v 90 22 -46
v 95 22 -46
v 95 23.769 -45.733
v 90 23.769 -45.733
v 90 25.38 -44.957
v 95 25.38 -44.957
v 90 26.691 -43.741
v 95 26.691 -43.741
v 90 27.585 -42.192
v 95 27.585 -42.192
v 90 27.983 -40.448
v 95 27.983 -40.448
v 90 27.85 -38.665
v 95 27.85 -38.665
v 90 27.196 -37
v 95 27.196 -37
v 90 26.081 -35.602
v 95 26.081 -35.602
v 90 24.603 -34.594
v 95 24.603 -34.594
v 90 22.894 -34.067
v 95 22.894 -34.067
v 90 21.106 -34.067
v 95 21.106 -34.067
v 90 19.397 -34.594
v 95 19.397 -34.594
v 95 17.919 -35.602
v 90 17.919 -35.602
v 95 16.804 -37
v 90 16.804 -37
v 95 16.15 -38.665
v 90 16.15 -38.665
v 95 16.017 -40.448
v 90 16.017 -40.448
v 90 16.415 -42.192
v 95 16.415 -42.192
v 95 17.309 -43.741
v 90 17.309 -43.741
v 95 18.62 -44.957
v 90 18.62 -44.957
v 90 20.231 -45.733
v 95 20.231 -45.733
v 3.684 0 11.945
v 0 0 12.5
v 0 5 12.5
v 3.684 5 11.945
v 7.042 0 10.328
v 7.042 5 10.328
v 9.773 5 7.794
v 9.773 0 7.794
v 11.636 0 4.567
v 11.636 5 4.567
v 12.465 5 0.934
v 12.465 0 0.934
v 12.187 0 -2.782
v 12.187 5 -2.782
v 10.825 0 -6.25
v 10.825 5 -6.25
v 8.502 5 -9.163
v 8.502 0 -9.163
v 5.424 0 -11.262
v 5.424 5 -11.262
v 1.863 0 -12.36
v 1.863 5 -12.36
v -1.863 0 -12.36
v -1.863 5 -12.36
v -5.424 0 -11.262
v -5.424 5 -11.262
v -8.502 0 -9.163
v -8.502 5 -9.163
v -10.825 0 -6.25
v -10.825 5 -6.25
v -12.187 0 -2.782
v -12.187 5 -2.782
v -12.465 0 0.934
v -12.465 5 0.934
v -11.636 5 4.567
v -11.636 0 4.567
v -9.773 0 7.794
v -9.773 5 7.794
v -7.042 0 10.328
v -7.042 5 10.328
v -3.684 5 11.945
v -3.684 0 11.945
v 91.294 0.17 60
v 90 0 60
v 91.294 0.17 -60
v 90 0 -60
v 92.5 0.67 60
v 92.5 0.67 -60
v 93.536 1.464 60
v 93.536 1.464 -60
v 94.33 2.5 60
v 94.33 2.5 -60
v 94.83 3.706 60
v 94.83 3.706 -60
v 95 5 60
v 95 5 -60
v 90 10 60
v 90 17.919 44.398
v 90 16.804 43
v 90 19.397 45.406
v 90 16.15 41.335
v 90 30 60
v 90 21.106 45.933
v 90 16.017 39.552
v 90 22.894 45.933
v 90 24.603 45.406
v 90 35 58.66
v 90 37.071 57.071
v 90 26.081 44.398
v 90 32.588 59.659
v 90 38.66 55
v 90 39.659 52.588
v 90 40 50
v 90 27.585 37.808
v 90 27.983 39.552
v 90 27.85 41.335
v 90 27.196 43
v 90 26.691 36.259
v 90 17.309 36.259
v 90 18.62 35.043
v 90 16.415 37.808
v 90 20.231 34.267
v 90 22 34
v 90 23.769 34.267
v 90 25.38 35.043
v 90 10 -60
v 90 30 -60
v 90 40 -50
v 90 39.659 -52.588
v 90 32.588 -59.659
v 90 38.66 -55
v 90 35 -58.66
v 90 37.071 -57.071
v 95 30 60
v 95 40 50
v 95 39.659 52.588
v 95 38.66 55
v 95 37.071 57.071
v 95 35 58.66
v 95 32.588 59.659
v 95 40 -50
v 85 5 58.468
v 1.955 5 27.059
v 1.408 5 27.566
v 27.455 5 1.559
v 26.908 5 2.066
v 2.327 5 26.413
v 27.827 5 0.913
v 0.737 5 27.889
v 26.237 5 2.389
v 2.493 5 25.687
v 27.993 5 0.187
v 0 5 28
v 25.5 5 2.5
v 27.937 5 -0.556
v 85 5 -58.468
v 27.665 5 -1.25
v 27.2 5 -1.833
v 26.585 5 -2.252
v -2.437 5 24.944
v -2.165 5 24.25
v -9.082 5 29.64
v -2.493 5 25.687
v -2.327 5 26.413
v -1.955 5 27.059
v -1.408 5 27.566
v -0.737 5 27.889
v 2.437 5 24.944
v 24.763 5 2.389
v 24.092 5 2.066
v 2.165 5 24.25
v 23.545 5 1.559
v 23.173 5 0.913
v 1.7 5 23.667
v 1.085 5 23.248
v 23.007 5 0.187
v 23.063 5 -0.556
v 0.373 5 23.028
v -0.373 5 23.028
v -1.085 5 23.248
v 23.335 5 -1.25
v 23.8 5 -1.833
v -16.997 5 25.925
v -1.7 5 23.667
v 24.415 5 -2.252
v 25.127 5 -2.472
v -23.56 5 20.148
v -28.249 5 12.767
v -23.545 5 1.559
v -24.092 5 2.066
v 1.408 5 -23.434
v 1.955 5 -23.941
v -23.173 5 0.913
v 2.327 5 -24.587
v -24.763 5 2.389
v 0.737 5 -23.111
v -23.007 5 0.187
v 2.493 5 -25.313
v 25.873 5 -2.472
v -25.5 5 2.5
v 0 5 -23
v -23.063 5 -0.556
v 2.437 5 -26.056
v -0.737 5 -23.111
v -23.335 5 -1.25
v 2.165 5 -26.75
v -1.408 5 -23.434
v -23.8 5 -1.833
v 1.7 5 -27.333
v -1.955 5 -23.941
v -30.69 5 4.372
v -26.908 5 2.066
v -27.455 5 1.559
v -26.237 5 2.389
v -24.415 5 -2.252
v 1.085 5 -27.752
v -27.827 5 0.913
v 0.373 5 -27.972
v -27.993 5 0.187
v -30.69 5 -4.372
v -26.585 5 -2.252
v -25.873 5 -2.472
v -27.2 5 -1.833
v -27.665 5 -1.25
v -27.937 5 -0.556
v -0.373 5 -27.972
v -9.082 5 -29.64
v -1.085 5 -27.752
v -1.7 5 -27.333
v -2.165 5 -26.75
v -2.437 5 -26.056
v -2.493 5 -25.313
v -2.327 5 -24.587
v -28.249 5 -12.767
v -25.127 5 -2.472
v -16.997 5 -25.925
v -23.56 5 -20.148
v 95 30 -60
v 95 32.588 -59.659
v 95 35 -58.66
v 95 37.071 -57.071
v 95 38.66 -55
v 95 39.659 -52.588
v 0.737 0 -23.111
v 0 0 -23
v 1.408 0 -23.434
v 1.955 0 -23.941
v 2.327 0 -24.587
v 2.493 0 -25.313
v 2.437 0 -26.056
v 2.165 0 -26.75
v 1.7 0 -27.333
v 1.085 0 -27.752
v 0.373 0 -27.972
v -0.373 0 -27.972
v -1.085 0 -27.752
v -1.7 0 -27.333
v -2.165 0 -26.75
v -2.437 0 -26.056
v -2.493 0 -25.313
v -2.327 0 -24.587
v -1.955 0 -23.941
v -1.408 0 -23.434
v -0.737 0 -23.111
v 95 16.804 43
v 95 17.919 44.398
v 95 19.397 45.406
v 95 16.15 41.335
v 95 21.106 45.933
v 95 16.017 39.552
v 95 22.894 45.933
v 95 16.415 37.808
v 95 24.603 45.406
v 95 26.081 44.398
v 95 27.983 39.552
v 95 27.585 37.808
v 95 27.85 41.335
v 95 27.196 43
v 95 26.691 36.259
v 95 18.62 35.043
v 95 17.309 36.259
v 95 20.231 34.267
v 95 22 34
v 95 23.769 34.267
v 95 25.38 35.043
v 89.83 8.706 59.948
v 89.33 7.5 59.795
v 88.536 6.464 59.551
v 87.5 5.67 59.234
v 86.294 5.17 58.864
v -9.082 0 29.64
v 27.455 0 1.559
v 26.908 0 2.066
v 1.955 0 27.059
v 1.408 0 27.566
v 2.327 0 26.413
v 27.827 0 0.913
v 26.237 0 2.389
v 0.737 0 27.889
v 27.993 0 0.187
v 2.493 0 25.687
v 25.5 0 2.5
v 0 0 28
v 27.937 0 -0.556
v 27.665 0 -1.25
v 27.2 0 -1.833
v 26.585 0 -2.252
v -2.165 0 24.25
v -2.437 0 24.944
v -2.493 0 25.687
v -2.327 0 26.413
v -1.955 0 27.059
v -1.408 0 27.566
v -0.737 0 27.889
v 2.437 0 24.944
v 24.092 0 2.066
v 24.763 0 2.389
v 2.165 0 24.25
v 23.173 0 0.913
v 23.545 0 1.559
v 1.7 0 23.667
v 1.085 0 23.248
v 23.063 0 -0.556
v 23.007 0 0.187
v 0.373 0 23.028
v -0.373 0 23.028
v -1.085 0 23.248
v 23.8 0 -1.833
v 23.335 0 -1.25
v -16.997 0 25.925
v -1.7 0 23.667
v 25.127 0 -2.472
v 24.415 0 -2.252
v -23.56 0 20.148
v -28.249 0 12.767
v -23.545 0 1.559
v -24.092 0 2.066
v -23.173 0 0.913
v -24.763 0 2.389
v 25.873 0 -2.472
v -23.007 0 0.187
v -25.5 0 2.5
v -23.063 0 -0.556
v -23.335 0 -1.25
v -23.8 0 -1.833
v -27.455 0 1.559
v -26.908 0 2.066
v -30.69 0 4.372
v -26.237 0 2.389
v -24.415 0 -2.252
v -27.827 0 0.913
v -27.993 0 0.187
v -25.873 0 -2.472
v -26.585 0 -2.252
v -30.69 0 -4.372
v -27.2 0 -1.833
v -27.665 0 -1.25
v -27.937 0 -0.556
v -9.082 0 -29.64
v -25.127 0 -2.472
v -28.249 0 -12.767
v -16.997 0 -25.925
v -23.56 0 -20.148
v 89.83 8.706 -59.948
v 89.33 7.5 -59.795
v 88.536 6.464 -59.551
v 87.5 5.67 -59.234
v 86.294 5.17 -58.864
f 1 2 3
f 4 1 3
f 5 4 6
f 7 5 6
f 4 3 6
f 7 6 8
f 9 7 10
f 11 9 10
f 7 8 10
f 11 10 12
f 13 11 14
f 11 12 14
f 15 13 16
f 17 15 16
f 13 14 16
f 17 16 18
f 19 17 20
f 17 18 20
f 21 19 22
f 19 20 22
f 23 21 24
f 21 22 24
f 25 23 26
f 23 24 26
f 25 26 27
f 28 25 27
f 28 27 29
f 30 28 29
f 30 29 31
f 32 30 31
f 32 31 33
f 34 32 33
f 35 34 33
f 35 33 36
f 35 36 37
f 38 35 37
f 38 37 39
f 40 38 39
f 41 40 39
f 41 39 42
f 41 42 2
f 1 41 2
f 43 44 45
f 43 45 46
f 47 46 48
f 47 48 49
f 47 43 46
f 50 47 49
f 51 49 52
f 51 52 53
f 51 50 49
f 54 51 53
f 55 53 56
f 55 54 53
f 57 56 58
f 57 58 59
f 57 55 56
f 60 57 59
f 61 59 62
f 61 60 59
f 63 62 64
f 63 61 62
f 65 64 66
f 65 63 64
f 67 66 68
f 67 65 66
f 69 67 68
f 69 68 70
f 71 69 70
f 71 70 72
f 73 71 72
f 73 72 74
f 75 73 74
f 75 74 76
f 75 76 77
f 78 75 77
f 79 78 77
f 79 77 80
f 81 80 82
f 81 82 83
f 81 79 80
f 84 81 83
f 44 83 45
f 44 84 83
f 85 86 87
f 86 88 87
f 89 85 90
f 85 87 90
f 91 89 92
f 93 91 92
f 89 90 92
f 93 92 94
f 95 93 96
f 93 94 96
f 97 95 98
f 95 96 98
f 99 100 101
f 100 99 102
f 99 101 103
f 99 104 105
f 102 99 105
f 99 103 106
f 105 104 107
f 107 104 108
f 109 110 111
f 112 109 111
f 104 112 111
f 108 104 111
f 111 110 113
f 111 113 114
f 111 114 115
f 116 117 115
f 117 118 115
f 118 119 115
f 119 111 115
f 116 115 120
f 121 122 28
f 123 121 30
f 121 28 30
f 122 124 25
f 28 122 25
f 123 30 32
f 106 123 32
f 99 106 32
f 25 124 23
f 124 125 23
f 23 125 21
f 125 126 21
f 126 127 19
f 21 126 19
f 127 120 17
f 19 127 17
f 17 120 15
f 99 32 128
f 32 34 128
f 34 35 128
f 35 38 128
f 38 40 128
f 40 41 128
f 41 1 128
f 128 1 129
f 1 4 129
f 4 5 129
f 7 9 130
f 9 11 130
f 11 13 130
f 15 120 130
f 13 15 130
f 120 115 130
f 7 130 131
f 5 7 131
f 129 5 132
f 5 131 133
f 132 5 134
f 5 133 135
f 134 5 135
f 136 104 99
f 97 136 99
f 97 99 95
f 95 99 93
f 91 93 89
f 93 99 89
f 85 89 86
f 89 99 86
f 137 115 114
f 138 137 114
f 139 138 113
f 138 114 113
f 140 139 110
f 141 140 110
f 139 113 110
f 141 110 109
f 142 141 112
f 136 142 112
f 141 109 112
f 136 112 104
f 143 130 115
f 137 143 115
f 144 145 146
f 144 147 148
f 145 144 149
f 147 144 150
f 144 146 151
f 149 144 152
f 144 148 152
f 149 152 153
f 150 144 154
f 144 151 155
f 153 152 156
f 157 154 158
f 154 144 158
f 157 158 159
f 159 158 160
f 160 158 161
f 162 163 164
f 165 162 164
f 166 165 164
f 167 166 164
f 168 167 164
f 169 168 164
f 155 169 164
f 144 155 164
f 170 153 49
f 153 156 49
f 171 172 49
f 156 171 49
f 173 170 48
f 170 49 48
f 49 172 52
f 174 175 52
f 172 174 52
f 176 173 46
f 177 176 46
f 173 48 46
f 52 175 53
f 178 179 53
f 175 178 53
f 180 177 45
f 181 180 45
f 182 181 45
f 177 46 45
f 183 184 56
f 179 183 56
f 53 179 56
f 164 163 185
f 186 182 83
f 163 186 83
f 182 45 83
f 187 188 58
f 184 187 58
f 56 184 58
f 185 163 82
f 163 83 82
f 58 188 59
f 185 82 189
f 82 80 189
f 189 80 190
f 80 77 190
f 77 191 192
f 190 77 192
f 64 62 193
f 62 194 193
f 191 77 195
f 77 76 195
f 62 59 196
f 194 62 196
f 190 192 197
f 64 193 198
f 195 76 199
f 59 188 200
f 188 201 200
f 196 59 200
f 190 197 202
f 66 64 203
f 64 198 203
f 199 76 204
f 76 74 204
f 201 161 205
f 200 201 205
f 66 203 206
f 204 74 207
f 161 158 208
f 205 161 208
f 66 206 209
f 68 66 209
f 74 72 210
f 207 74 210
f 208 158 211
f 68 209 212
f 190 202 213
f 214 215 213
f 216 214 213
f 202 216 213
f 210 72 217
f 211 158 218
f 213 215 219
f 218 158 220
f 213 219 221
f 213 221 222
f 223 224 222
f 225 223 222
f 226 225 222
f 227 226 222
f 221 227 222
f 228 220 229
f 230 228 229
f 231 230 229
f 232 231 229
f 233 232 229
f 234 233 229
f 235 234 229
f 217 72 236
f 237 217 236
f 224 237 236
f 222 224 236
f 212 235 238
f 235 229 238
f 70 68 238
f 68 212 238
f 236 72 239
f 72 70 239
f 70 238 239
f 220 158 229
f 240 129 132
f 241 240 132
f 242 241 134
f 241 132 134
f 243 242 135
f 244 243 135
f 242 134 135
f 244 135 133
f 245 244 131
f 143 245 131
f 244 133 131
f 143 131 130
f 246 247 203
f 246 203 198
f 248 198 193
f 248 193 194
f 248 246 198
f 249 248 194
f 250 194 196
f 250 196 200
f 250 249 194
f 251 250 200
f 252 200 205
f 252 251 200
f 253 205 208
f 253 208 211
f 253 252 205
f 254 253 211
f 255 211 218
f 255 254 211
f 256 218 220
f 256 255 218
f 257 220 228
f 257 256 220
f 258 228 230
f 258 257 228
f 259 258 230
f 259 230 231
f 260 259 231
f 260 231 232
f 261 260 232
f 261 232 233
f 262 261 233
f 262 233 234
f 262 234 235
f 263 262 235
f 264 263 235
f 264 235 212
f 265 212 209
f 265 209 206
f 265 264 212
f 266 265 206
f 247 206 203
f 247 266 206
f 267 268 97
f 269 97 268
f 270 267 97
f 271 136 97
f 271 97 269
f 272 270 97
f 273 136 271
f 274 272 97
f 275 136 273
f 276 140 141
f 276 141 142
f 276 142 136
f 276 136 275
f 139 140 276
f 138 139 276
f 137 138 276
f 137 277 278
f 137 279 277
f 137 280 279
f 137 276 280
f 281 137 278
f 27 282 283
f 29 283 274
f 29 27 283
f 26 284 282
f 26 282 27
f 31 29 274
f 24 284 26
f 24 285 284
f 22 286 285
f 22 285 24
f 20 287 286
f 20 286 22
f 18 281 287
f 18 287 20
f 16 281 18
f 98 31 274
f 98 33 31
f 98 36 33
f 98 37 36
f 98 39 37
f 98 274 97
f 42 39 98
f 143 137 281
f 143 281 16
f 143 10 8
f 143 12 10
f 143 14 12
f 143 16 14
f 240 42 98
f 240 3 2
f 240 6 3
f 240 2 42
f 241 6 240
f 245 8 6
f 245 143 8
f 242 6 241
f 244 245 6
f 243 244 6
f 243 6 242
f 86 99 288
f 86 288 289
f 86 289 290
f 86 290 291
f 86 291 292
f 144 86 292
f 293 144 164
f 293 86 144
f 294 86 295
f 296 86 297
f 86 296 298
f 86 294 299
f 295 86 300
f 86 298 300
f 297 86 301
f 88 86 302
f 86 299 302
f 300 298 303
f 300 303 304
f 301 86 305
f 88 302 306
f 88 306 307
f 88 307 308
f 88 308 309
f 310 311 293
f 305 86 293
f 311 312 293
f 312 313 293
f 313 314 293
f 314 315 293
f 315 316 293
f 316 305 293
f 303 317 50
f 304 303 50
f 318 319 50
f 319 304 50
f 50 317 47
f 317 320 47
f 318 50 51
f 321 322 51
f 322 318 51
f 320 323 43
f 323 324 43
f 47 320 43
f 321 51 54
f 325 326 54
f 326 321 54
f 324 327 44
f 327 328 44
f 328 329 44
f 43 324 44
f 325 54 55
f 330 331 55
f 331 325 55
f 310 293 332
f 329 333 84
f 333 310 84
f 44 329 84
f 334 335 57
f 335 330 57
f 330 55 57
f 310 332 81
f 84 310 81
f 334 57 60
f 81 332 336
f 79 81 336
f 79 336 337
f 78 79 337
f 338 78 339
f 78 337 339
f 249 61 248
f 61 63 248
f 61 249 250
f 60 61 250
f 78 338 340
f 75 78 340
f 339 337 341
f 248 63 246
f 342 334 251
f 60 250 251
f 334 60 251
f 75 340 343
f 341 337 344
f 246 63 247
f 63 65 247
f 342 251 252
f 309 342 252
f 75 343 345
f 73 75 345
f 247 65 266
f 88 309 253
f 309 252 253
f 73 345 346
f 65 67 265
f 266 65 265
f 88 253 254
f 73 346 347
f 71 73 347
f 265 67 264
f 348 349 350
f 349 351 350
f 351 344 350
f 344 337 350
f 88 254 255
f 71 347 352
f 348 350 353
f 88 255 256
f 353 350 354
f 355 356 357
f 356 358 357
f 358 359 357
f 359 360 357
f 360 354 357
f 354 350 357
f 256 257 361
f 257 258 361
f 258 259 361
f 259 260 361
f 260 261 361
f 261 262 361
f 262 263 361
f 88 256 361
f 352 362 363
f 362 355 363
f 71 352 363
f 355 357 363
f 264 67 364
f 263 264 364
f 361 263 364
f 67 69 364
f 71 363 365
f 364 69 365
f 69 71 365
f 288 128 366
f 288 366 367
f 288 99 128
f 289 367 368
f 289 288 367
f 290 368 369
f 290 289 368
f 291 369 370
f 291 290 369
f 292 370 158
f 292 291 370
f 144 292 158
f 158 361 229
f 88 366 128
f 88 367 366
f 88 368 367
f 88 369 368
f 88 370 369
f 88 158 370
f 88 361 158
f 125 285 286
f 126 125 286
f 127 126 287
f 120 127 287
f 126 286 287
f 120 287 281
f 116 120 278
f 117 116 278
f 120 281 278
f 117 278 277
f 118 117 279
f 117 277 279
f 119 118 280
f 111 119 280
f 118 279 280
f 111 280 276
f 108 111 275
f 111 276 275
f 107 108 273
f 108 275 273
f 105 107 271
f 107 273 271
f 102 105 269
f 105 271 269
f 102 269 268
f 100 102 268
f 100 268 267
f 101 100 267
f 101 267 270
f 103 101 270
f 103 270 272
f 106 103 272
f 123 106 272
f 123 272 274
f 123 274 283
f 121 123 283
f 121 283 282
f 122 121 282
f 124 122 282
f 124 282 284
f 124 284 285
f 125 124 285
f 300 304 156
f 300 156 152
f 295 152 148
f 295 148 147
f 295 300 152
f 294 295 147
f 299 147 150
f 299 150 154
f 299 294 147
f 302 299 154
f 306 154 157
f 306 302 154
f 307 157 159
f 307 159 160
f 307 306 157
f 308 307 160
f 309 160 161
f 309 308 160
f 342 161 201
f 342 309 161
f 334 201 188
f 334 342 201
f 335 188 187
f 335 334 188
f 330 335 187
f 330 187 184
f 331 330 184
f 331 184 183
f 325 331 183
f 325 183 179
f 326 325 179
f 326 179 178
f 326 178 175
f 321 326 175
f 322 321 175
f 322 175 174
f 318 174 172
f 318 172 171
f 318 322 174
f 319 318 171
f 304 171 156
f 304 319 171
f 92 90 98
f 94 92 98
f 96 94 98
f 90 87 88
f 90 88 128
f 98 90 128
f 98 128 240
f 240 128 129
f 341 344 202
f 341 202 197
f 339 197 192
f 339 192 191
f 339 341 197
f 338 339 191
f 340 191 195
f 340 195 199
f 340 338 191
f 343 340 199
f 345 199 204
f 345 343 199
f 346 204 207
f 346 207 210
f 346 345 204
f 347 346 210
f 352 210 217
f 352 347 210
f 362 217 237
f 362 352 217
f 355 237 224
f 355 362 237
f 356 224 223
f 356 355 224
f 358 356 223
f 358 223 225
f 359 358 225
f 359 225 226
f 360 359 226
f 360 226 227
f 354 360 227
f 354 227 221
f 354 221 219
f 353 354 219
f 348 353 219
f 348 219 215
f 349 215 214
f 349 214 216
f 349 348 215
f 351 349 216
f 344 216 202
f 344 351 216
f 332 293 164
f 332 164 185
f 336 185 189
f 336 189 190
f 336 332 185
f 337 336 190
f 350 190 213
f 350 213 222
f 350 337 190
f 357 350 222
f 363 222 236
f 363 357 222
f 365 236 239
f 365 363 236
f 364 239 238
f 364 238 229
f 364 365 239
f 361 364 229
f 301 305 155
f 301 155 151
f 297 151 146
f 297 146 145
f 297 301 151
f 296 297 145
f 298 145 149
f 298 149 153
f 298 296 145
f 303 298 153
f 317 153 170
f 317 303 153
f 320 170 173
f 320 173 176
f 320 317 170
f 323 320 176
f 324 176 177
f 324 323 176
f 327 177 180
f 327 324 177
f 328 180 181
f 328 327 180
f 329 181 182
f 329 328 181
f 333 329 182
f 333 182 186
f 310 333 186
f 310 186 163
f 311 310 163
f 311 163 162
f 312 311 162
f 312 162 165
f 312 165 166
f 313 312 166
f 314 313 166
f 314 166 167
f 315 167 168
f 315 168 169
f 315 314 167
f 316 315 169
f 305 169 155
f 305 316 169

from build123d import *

# Parameters (mm, degrees)
SKETCH1_R           = 2.5
SKETCH1_R_2         = 12.5
BOSS_EXTRUDE1_DEPTH = 5
BOSS_EXTRUDE2_DEPTH = 5
FILLET1_R           = 5
SKETCH3_R           = 6
CUT_EXTRUDE1_DEPTH  = 10


with BuildPart() as part:
    # Sketch1 → Boss-Extrude1 (new body)
    with BuildSketch(Plane(origin=(0, 0, 0), x_dir=(1, 0, 0), z_dir=(0, 1, 0))):
        with BuildLine():
            Line((90, 60), (90, -60))
            Line((90, -60), (-9.08206944, -29.639770827))
            ThreePointArc((-9.08206944, -29.639770827), (-31, 0), (-9.08206944, 29.639770827))
            Line((-9.08206944, 29.639770827), (90, 60))
        make_face()
        with Locations(Location((0, 25.5, 0), (0, 0, 270))):
            Circle(SKETCH1_R, mode=Mode.SUBTRACT)
        with Locations(Location((-25.5, 0, 0), (0, 0, 270))):
            Circle(SKETCH1_R, mode=Mode.SUBTRACT)
        with Locations(Location((25.5, 0, 0), (0, 0, 270))):
            Circle(SKETCH1_R, mode=Mode.SUBTRACT)
        with Locations(Location((0, -25.5, 0), (0, 0, 270))):
            Circle(SKETCH1_R, mode=Mode.SUBTRACT)
        with Locations(Location((0, 0, 0), (0, 0, 270))):
            Circle(SKETCH1_R_2, mode=Mode.SUBTRACT)
    extrude(amount=BOSS_EXTRUDE1_DEPTH)

    # Sketch2 → Boss-Extrude2 (add)
    with BuildSketch(Plane(origin=(90, 0, 0), x_dir=(0, 0, -1), z_dir=(1, 0, 0))):
        with BuildLine():
            Line((-60, 0), (60, 0))
            Line((60, 0), (60, 30))
            ThreePointArc((60, 30), (57.071067812, 37.071067812), (50, 40))
            Line((50, 40), (-50, 40))
            ThreePointArc((-50, 40), (-57.071067812, 37.071067812), (-60, 30))
            Line((-60, 30), (-60, 0))
        make_face()
    extrude(amount=BOSS_EXTRUDE2_DEPTH)

    # Fillet1
    fillet1_edges = [part.edges().sort_by_distance(p)[0] for p in [
        (95, 0, 0),
        (90, 5, 0),
    ]]
    fillet(fillet1_edges, radius=FILLET1_R)

    # Sketch3 → Cut-Extrude1 (cut)
    with BuildSketch(Plane(origin=(95, 0, 0), x_dir=(0, 0, -1), z_dir=(1, 0, 0))):
        with Locations((-40, 22)):
            Circle(SKETCH3_R)
        with Locations((40, 22)):
            Circle(SKETCH3_R)
    extrude(amount=-CUT_EXTRUDE1_DEPTH, mode=Mode.SUBTRACT)


solid = part.part
